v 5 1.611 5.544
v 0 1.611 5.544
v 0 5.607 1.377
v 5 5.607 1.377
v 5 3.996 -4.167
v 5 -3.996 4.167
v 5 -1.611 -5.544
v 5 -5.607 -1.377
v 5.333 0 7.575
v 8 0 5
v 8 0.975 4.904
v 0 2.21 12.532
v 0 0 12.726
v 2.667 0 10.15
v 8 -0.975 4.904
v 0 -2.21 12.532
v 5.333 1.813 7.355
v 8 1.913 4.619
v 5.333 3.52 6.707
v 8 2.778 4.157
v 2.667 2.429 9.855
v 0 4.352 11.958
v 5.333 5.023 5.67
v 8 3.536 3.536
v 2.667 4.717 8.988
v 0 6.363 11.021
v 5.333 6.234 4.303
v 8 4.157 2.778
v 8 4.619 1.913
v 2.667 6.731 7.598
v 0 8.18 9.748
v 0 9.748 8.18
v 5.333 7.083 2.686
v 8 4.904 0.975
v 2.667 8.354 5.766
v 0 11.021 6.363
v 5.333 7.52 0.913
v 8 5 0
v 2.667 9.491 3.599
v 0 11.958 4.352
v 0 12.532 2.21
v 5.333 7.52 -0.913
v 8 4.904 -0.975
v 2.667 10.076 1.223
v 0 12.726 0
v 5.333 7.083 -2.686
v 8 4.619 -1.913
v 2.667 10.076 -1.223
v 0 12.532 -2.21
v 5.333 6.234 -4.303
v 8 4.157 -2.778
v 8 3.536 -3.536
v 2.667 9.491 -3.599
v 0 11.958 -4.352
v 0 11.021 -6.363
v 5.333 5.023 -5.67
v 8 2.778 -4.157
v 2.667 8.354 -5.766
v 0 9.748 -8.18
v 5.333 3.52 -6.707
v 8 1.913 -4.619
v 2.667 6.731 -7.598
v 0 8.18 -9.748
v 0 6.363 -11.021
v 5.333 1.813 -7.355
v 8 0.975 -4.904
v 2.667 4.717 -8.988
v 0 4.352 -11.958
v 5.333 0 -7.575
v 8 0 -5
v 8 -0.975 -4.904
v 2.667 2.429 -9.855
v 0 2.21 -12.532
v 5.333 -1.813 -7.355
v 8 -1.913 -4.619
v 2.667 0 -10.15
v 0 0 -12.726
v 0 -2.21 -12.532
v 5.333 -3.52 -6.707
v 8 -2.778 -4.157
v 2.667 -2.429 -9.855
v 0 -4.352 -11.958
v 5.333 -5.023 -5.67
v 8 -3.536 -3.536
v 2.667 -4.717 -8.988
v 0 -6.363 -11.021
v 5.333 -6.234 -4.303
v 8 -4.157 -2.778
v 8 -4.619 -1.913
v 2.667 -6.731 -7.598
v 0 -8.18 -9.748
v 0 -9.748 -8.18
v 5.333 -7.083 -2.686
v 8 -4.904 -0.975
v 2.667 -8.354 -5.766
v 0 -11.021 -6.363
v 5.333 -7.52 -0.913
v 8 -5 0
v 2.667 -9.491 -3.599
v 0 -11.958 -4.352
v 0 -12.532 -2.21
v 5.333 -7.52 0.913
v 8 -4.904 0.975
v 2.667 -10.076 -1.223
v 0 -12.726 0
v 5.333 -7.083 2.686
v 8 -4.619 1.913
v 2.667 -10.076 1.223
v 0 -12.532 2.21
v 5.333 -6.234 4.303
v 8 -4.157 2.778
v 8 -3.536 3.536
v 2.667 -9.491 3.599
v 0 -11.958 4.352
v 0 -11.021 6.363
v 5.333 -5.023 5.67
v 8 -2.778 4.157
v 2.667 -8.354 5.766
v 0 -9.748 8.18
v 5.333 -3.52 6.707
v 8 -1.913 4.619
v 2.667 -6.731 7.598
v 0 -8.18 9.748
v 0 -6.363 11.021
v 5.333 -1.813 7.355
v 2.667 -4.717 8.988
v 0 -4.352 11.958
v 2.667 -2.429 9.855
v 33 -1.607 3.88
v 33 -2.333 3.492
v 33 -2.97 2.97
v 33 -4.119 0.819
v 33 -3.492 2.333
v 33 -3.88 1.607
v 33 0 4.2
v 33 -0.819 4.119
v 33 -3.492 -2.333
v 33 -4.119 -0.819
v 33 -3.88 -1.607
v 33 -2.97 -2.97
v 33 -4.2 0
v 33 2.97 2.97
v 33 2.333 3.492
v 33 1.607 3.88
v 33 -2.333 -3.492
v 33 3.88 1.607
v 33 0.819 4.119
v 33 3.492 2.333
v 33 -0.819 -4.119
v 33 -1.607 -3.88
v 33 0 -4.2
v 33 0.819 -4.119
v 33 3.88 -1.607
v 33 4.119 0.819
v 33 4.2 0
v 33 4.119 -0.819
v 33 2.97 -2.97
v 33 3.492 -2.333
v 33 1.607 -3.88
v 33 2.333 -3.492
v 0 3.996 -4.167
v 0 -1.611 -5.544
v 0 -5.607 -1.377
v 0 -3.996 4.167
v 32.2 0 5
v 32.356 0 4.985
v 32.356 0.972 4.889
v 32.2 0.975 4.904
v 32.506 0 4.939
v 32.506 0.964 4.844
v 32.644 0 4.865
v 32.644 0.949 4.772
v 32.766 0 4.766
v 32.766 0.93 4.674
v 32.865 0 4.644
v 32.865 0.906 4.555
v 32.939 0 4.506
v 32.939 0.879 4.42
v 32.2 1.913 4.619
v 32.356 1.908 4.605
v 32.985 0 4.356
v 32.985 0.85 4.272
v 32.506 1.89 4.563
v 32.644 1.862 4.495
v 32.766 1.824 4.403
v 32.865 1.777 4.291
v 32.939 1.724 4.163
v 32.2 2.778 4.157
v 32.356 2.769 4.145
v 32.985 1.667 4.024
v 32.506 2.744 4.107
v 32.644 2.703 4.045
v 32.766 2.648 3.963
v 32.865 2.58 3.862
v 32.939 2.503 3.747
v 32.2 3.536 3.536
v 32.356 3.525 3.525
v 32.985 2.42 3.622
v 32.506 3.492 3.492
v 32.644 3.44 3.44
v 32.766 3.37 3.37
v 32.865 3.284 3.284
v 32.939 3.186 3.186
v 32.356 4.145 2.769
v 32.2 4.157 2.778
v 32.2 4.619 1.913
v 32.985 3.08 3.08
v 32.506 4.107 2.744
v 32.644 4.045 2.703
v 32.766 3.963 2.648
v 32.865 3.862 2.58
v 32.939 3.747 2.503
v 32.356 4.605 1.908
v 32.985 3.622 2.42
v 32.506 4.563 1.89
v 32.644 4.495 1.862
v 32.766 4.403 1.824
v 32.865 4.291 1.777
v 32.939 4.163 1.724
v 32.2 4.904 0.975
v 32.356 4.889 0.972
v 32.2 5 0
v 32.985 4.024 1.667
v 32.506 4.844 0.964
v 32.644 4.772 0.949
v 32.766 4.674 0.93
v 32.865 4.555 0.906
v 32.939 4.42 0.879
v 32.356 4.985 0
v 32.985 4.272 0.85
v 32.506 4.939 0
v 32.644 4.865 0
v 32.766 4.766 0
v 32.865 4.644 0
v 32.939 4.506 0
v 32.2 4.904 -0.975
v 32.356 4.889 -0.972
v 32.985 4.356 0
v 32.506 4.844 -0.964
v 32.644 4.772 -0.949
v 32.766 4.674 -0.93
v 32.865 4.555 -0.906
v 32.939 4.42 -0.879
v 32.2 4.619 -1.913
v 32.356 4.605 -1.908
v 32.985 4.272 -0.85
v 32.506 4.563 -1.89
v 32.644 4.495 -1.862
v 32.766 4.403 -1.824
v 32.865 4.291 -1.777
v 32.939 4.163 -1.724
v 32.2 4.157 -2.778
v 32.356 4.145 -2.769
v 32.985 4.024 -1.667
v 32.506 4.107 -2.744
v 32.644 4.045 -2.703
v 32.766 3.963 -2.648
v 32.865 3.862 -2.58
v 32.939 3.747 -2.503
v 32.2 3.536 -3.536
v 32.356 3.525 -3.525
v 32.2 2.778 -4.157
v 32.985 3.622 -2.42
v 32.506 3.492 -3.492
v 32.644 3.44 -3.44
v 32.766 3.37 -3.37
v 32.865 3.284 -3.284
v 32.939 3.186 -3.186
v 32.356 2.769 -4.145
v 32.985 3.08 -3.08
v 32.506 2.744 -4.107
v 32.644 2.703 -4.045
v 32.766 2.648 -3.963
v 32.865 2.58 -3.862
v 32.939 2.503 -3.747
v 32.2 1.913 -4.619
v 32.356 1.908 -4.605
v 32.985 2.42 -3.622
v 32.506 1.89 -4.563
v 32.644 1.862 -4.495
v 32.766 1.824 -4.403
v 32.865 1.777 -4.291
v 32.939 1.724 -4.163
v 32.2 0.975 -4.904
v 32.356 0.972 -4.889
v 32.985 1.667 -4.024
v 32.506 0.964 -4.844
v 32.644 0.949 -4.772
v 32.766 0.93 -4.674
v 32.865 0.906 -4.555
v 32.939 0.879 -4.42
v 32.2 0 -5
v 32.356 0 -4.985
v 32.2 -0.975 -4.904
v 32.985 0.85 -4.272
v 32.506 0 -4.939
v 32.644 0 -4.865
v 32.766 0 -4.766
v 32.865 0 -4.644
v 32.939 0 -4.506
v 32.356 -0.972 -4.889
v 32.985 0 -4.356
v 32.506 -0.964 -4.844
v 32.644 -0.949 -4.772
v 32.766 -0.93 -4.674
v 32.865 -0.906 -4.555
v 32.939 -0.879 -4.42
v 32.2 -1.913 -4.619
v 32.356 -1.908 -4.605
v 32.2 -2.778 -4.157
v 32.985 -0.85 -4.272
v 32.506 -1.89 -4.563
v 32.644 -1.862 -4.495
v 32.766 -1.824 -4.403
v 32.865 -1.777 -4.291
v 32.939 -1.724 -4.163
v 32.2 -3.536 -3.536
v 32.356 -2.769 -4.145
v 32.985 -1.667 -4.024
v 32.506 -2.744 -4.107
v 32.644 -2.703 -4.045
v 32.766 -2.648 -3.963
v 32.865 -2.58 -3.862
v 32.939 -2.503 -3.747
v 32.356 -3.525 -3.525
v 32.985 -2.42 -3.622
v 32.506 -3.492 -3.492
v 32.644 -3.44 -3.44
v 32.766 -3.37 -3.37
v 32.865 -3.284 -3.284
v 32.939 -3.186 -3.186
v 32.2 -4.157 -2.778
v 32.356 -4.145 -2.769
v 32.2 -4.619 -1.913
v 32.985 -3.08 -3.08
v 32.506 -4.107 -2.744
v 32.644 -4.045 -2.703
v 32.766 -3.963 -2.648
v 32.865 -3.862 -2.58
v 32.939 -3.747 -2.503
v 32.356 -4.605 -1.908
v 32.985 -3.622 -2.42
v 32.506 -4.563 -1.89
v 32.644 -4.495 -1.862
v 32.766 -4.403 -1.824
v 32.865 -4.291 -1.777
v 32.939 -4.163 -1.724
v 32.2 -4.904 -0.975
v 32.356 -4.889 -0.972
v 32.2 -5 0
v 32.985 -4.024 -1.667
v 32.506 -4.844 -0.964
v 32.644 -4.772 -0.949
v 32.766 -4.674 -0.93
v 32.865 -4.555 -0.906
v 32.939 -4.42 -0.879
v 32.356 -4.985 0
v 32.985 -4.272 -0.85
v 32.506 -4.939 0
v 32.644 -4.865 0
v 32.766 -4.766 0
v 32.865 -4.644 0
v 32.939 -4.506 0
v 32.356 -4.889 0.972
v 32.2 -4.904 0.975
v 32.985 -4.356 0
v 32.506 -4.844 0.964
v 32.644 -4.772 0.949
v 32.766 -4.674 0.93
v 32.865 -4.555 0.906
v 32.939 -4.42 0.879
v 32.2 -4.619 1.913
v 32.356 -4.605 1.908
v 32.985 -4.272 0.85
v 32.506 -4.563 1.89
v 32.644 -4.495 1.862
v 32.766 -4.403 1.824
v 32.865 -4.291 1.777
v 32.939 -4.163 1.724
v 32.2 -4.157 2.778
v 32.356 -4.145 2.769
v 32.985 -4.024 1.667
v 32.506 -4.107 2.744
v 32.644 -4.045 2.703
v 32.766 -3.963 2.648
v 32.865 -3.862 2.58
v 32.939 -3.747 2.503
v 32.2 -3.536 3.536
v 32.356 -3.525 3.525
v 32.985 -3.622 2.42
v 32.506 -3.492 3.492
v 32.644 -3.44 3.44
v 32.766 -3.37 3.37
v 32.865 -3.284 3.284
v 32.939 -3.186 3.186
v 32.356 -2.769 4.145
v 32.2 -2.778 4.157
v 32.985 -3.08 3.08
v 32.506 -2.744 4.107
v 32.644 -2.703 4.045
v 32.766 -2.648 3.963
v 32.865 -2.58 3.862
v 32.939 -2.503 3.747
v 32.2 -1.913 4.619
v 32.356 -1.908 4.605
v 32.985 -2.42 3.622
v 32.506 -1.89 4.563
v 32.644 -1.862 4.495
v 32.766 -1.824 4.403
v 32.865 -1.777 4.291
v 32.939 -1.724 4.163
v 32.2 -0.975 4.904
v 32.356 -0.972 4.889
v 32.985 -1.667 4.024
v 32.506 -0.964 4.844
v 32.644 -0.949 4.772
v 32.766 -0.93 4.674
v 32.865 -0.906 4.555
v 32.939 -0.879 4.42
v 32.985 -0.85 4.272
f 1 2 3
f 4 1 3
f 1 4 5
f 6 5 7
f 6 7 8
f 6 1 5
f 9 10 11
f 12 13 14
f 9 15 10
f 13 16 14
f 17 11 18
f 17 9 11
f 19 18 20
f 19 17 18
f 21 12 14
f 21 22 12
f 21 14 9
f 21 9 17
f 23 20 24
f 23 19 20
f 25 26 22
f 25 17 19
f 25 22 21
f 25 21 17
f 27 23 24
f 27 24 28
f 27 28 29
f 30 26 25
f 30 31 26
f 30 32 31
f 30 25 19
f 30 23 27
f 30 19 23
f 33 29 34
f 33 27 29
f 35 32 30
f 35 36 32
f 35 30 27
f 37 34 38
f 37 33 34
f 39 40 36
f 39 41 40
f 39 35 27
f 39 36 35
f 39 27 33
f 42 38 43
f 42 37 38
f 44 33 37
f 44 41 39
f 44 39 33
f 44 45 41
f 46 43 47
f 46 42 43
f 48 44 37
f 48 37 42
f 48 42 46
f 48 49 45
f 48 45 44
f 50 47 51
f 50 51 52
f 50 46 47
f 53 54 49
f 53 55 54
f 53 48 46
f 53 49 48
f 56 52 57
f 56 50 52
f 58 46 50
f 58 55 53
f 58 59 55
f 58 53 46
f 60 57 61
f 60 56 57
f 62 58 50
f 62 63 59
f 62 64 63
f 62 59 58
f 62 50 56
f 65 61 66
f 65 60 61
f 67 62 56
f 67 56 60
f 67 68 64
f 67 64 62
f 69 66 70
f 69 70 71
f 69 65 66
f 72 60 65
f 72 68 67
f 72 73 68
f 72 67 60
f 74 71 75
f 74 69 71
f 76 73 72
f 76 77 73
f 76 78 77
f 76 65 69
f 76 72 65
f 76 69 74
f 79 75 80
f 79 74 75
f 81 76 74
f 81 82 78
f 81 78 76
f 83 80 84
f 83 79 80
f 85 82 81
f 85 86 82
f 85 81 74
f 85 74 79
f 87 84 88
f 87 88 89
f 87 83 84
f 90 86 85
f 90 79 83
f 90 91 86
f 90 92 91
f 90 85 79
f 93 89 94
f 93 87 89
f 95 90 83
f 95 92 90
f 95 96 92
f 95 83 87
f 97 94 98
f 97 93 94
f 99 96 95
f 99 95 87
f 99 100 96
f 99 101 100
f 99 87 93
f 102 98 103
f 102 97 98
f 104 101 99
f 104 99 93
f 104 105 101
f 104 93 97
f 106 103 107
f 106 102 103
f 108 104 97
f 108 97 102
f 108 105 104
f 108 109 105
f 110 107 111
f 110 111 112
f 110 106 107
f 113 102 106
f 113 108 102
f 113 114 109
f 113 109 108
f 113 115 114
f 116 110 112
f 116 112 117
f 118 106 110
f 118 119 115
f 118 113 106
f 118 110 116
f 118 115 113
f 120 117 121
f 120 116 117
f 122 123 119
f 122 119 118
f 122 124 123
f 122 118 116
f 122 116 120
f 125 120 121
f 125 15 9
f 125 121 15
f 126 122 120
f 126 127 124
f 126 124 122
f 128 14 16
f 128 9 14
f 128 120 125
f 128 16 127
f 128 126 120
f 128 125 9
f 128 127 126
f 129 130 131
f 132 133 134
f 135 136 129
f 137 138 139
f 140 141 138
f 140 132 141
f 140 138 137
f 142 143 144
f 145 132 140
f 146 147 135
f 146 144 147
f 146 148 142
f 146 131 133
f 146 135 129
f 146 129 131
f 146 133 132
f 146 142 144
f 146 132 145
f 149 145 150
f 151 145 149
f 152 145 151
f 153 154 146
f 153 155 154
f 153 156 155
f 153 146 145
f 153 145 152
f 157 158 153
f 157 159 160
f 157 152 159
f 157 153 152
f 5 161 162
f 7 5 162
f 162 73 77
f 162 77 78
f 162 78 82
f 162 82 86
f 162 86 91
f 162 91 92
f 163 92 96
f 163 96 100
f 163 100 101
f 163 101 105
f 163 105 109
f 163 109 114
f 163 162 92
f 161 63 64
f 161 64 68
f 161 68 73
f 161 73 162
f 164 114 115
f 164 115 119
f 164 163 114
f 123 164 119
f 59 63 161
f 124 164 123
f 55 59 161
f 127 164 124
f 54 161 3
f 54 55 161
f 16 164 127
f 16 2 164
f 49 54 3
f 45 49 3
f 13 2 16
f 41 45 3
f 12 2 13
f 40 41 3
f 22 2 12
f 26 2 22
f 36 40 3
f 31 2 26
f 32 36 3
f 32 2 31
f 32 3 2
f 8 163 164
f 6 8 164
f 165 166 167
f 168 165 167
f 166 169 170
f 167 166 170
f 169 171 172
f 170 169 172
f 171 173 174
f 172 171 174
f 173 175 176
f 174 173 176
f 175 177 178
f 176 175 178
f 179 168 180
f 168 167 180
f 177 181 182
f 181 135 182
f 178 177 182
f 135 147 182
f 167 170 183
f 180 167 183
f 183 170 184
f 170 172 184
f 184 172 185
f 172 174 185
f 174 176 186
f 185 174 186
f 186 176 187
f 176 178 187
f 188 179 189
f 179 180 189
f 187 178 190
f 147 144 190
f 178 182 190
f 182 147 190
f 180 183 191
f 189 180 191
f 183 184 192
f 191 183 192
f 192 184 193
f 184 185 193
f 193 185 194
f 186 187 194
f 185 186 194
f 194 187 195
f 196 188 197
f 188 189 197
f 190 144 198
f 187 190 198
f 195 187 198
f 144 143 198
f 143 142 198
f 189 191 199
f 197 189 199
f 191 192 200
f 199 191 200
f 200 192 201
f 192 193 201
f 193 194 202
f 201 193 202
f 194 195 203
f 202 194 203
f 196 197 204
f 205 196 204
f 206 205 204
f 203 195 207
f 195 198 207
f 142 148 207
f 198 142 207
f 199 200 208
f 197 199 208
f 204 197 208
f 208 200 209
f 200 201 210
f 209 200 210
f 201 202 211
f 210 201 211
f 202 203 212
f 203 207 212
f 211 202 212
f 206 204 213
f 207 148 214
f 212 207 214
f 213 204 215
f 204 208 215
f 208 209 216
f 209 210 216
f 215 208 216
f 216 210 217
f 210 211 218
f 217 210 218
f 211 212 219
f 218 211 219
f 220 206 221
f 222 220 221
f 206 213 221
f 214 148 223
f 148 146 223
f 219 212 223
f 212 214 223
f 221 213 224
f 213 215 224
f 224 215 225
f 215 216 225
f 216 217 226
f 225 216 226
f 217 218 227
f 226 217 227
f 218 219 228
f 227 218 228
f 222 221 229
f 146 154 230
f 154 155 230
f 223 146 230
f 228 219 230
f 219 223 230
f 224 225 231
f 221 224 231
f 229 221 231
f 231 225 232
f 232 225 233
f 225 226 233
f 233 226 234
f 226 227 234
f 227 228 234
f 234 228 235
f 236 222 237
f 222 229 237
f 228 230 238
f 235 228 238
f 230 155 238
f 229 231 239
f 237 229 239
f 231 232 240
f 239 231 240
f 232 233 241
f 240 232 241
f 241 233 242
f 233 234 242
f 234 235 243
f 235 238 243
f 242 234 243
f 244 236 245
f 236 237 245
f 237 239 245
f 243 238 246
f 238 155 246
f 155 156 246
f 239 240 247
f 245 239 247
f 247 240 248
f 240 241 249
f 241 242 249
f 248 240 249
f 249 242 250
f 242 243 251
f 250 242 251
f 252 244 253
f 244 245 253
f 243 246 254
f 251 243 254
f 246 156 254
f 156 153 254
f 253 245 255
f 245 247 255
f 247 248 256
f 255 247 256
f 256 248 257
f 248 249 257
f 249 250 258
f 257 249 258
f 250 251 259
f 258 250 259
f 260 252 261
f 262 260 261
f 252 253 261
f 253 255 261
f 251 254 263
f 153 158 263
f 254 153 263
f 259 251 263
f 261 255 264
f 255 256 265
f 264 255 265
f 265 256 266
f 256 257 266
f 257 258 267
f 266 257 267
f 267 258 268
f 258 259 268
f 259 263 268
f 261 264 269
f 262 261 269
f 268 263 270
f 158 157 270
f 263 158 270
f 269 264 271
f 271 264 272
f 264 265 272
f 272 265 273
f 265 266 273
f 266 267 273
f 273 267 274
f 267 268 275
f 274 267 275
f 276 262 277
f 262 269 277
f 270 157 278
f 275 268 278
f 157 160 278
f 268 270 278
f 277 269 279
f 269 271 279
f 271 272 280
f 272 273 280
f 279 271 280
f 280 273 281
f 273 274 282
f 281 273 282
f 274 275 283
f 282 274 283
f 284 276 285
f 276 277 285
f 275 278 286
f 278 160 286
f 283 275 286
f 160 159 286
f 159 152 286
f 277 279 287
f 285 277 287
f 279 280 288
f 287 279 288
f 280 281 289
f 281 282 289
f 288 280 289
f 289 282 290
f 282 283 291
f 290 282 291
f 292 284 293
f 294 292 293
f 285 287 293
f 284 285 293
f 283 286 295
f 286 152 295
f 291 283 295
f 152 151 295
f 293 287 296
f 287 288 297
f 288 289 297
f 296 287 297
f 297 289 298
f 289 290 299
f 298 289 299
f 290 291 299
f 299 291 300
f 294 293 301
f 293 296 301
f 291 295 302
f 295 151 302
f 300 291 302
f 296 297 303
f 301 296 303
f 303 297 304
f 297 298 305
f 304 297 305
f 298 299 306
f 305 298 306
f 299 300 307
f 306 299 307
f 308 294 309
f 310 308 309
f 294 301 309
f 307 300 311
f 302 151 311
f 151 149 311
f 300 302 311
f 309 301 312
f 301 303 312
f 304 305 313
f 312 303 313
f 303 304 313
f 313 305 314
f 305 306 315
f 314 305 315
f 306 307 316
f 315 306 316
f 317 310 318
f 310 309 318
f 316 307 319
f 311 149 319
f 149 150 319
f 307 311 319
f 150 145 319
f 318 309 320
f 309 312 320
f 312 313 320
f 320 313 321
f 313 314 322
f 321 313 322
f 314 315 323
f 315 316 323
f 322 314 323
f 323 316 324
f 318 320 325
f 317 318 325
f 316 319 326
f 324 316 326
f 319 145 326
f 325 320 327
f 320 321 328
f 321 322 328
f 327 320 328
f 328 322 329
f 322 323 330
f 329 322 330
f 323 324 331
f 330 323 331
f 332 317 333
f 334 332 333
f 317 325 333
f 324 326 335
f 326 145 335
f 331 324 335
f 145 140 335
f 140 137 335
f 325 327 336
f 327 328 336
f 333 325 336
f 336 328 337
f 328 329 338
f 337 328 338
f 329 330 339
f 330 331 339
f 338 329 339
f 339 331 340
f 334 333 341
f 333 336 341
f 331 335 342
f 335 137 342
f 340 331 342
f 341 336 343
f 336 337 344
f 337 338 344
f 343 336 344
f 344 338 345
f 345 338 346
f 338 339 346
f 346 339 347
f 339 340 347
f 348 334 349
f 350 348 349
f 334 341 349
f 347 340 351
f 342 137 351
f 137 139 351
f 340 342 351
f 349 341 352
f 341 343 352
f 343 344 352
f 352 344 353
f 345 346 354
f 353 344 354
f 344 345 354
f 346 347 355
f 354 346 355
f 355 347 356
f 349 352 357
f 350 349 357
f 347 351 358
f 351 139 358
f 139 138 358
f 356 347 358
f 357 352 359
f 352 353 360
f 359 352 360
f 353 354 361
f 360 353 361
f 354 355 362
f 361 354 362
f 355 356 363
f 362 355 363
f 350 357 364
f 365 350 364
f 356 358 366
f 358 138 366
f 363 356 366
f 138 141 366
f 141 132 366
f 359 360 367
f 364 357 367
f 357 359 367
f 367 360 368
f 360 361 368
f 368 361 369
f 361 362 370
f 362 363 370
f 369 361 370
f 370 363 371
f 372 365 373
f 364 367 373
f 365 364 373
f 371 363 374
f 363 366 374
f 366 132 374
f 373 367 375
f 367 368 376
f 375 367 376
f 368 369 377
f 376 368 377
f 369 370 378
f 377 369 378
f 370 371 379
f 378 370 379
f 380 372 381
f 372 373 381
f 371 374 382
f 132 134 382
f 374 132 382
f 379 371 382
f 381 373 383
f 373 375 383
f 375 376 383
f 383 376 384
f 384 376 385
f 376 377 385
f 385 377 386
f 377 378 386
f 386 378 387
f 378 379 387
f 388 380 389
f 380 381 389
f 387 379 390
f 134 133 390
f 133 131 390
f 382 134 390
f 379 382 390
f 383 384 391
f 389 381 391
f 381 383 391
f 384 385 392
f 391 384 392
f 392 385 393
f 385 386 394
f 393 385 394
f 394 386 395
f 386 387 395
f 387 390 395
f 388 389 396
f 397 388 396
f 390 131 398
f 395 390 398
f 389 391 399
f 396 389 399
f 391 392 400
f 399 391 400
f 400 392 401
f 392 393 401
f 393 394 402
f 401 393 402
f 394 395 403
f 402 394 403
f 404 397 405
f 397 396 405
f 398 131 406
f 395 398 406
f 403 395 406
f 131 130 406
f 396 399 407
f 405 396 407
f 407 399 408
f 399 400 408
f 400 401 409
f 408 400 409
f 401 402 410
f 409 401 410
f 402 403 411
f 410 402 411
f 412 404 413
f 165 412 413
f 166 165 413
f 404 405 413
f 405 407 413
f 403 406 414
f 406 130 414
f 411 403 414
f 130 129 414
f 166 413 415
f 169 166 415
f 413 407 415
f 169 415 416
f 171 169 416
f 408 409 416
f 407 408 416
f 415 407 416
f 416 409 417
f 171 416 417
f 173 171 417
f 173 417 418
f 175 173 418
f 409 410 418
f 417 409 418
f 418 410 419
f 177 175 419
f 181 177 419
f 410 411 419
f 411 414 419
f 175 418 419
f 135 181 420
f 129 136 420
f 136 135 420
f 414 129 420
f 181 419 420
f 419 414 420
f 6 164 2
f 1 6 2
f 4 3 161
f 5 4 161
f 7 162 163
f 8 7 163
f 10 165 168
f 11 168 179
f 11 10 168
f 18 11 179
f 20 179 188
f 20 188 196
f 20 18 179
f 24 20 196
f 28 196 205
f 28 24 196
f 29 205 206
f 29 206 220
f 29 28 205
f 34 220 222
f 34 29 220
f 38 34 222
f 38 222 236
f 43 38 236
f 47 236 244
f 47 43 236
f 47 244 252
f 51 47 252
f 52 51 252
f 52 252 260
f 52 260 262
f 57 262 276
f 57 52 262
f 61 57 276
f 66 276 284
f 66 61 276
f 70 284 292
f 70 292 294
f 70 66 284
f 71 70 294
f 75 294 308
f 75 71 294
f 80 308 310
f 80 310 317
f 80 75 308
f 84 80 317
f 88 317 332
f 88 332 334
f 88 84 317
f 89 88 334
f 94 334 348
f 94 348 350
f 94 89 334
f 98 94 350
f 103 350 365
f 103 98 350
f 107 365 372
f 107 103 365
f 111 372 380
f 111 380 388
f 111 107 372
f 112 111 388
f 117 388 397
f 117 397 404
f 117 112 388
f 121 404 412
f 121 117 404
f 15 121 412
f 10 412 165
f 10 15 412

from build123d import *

# Parameters (mm, degrees)
F3_DEPTH = 5
F4_R     = 0.8


with BuildPart() as f1:
    # F0 (on Front) → F1 (revolve)
    with BuildSketch(Plane.XZ):
        Polygon((0, 12.72551), (0, 0), (33, 0), (33, 5), (8, 5), align=None)
    revolve(axis=Axis((16.5, 0, 0), (-1, 0, 0)))

    # F2 (on face) → F3 (cut)
    with BuildSketch(Plane(origin=(0, 0, 0), x_dir=(0, -1, 0), z_dir=(-1, 0, 0))):
        Polygon((3.996034, 4.167138), (-1.610831, 5.544236), (-5.606865, 1.377098), (-3.996034, -4.167138), (1.610831, -5.544236), (5.606865, -1.377098), align=None)
    extrude(amount=-F3_DEPTH, mode=Mode.SUBTRACT)

    # F4
    f4_edges = [f1.edges().sort_by_distance(p)[0] for p in [
        (33, 0, -5),
    ]]
    fillet(f4_edges, radius=F4_R)


solid = f1.part
